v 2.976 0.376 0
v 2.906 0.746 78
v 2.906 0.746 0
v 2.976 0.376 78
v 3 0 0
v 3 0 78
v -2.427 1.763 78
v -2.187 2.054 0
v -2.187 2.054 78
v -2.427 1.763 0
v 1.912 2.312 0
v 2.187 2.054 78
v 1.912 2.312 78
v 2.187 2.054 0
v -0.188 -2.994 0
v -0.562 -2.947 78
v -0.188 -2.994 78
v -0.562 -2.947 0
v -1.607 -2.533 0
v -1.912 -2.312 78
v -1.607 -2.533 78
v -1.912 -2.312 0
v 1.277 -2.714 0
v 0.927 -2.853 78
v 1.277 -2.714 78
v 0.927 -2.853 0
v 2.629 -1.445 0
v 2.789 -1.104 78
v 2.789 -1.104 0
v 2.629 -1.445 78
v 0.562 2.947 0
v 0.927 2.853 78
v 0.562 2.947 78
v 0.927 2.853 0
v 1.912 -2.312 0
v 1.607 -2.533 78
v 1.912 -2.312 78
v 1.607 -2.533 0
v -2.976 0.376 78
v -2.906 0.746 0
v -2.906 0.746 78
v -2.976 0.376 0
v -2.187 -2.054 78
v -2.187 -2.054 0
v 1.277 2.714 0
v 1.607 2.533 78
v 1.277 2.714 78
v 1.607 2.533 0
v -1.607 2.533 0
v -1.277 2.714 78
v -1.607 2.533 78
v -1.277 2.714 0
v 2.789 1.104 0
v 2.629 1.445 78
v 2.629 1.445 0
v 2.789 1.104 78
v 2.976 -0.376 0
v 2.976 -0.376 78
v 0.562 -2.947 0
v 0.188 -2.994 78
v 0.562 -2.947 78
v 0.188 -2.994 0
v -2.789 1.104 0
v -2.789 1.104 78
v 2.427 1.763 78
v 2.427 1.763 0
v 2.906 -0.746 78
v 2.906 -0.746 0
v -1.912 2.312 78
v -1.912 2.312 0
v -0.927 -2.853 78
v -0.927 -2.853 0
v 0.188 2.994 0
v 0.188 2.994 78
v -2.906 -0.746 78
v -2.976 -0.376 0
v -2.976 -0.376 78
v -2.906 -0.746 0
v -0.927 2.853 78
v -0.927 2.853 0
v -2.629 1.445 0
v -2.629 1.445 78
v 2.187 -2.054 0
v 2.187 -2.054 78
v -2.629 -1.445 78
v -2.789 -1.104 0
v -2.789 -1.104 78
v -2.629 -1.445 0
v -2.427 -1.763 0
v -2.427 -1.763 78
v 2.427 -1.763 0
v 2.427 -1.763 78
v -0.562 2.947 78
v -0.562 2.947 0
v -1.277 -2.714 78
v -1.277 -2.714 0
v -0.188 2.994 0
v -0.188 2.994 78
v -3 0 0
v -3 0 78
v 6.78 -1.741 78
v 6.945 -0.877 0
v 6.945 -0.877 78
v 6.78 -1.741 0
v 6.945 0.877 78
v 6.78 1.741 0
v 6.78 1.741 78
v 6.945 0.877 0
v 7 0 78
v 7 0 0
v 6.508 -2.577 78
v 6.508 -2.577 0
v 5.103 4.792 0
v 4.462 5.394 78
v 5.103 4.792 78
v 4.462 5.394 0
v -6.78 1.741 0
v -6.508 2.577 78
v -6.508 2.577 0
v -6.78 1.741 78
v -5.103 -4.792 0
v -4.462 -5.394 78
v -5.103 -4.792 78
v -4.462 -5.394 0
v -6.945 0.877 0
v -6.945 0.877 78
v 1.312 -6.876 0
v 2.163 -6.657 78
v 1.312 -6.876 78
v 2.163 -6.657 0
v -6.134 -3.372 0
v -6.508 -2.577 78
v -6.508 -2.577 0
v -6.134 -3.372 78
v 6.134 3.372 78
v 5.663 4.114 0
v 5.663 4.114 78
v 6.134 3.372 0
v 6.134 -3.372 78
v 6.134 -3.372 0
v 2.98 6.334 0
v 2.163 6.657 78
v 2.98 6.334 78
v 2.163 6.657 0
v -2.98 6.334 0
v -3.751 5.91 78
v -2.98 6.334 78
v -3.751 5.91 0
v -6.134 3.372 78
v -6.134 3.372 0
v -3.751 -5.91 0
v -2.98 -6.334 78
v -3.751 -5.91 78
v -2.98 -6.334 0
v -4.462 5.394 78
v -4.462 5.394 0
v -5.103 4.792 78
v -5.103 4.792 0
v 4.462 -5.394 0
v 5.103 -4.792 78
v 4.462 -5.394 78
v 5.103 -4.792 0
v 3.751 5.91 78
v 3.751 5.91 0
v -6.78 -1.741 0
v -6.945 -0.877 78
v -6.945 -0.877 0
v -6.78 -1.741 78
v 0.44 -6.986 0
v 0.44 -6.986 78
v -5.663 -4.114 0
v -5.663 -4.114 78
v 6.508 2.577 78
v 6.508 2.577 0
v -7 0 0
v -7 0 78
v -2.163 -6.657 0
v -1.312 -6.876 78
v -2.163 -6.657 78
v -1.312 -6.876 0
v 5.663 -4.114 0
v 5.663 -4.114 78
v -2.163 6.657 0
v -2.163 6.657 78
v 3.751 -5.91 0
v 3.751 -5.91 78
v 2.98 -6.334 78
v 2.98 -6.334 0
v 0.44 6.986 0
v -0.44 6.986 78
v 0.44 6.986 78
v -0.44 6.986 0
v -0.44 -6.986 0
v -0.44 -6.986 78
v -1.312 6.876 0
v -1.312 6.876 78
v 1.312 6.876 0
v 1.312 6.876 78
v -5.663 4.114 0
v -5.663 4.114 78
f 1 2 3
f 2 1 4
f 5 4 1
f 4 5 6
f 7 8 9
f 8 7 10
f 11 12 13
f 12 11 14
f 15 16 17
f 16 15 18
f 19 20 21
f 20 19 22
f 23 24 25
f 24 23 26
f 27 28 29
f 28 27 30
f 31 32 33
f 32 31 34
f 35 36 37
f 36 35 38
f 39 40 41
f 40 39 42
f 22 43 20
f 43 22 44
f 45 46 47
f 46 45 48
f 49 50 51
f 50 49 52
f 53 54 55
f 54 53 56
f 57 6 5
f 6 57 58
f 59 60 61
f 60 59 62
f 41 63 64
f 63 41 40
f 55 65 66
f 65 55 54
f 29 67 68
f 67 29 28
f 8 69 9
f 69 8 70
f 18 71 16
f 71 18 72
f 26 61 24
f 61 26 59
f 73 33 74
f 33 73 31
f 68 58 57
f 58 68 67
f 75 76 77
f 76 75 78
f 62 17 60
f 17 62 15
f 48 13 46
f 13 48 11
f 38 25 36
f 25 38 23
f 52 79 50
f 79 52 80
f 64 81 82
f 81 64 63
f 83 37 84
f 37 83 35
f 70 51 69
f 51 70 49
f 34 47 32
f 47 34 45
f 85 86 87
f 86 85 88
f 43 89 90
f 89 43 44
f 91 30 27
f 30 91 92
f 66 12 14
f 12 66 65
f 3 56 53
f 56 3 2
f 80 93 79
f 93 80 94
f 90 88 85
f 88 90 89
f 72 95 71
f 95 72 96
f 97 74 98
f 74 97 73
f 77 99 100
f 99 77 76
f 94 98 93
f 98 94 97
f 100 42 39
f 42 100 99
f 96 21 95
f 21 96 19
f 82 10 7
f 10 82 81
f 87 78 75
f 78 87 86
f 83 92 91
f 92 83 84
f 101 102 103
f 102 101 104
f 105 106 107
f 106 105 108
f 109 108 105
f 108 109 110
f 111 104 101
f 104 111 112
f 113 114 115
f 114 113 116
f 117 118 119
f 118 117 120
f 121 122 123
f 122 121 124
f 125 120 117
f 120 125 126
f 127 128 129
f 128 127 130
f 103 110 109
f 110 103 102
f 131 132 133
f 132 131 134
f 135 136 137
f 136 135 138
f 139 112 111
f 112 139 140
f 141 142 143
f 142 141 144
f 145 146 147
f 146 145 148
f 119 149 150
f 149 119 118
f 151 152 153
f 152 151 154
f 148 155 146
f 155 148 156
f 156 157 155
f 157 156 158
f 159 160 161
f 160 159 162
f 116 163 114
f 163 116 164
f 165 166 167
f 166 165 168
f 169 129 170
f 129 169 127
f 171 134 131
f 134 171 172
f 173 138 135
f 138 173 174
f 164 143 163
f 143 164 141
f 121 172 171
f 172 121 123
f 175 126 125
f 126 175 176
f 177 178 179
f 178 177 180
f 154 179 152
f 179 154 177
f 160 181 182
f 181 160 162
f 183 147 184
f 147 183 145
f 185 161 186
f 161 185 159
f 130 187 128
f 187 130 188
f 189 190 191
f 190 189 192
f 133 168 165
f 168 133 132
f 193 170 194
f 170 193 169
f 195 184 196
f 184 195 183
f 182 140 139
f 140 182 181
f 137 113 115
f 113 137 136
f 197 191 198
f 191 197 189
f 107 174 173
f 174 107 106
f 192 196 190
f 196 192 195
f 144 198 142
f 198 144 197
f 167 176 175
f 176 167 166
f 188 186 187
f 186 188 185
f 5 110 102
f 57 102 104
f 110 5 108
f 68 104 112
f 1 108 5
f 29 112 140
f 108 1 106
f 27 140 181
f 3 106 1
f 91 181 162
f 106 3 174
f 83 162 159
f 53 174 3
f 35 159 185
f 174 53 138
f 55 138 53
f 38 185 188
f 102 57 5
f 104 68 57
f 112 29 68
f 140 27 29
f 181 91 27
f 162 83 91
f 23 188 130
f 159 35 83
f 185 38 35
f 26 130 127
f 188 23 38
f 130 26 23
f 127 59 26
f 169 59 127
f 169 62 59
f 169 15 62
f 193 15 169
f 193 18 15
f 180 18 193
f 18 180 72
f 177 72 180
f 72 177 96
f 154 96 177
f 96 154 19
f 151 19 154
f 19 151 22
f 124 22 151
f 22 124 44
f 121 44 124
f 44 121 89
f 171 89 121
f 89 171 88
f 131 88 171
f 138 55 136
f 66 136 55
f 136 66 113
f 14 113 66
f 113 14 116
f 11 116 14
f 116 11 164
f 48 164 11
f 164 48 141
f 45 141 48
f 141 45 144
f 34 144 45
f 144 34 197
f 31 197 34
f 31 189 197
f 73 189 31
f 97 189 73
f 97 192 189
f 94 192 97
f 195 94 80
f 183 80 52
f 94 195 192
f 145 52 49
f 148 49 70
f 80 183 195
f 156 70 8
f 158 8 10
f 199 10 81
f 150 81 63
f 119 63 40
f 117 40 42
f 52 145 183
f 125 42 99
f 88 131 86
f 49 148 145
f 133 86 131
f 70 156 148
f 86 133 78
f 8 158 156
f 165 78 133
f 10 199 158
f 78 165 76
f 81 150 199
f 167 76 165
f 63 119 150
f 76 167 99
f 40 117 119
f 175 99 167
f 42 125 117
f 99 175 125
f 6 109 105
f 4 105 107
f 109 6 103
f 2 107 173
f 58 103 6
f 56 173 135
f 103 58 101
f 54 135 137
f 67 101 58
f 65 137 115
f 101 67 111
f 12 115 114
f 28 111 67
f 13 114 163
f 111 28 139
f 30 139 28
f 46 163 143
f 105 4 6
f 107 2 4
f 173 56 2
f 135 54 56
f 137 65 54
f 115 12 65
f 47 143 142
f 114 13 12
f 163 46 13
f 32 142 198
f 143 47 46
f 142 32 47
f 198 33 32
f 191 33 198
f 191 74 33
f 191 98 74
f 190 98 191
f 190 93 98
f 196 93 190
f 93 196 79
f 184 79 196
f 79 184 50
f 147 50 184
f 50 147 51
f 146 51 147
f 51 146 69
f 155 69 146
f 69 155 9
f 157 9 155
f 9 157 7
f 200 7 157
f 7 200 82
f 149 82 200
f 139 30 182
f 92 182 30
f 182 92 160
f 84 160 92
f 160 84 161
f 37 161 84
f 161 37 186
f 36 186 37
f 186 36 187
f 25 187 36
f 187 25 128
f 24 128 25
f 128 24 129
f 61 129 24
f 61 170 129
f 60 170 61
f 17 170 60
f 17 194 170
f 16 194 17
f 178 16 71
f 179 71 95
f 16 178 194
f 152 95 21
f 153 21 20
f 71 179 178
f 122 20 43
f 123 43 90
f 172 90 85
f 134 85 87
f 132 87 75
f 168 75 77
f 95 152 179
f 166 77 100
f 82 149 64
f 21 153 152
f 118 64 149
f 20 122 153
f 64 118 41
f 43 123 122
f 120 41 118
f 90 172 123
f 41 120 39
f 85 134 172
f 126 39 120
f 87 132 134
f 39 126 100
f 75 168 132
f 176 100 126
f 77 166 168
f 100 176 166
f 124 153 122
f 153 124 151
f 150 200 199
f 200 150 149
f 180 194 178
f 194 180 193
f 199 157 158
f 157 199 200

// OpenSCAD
$fn = 50;


difference() {
	union() {
		cylinder(h = 78, r = 7.0000000000);
	}
	union() {
		translate(v = [0.0000000000, 0.0000000000, -100.0000000000]) {
			cylinder(h = 200, r = 3.0000000000);
		}
		cylinder(h = 78, r = 1.5000000000);
		cylinder(h = 78, r = 1.5000000000);
		cylinder(h = 78, r = 1.5000000000);
	}
}
